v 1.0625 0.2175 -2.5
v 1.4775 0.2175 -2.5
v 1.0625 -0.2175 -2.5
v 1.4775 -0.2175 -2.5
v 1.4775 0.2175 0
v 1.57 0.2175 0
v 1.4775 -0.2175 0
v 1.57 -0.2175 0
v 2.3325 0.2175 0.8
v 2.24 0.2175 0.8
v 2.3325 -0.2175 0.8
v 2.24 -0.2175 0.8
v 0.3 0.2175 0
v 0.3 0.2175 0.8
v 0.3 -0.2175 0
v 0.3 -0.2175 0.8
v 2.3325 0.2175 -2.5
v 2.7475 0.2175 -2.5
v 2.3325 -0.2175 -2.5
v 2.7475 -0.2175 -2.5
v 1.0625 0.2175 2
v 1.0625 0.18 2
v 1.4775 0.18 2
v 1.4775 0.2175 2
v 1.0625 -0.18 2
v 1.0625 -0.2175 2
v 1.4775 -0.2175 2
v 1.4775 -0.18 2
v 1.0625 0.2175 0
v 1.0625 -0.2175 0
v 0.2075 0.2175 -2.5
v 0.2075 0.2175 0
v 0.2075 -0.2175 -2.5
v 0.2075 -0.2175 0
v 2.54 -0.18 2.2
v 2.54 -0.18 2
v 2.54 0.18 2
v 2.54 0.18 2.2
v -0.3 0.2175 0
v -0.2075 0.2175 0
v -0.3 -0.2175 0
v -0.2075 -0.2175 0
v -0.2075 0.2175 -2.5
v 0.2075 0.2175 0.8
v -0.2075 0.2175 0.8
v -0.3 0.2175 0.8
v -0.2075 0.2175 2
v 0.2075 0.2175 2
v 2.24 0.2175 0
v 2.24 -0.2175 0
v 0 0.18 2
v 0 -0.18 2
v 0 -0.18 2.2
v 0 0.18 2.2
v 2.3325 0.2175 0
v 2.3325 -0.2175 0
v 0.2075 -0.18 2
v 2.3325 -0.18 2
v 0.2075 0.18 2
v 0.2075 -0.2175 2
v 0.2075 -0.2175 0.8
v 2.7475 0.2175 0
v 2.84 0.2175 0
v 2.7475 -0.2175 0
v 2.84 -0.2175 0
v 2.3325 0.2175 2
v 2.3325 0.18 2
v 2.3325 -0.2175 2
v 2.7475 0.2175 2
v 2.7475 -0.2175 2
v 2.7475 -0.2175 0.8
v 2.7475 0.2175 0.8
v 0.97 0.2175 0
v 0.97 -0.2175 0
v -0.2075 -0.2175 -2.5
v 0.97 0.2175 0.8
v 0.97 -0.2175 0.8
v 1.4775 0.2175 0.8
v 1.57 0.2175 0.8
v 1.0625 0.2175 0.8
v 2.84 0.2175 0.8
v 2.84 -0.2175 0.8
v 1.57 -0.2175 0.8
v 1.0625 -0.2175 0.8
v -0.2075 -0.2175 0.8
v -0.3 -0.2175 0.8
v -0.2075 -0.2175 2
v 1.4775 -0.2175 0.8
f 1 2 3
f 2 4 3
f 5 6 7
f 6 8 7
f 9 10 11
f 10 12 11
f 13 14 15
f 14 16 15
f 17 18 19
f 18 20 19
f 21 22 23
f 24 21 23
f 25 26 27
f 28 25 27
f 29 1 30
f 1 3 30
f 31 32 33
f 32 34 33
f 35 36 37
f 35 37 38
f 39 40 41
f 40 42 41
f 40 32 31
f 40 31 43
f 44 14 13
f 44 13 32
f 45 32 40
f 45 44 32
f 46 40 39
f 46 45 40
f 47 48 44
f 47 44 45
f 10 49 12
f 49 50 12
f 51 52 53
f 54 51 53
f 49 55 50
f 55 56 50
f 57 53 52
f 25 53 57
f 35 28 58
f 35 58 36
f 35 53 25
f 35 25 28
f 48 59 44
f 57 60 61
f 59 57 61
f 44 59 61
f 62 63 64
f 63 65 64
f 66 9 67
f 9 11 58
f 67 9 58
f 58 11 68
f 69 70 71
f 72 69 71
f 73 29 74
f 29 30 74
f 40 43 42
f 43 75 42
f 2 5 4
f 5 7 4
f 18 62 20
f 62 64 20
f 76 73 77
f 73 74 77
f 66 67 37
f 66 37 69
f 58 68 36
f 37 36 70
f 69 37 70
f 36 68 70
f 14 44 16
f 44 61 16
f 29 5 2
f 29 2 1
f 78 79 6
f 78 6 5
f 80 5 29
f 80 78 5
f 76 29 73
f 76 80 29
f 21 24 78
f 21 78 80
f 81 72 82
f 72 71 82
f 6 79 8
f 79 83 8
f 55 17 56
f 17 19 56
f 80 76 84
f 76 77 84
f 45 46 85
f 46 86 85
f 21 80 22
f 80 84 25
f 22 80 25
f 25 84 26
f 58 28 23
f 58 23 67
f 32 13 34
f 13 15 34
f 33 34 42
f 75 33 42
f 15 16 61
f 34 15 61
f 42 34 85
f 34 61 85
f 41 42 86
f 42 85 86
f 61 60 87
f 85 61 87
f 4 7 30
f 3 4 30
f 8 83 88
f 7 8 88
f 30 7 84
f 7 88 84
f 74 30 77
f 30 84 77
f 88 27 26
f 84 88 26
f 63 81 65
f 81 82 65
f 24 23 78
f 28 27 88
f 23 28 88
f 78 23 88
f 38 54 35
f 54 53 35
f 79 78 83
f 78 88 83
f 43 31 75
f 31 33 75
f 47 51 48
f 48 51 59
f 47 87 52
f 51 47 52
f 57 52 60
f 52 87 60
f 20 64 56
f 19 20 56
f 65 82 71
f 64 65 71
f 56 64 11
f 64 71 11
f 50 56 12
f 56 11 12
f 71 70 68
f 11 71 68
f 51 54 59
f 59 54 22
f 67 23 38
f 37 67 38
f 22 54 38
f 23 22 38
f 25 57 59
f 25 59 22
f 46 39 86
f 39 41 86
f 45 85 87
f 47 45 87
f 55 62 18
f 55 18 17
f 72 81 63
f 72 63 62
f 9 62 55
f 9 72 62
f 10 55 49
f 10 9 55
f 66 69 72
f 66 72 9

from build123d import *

# Parameters (mm, degrees)
SKETCH001_W         = 2.54
SKETCH001_H         = 0.2
PAD001_DEPTH        = 0.18
PAD002_DEPTH        = 0.2175
LINEARPATTERN_COUNT = 3
LINEARPATTERN_PITCH = 1.27


with BuildPart() as part:
    # Sketch001 → Pad001 (new body, symmetric)
    with BuildSketch(Plane.XZ):
        with Locations((1.27, 2.1)):
            Rectangle(SKETCH001_W, SKETCH001_H)
    extrude(amount=PAD001_DEPTH, both=True)

    # Sketch002 → Pad002 (join, symmetric)
    with BuildSketch(Plane.XZ):
        Polygon((0.2075, 2), (0.2075, 0.8), (0.3, 0.8), (0.3, 0), (0.2075, 0), (0.2075, -2.5), (-0.2075, -2.5), (-0.2075, 0), (-0.3, 0), (-0.3, 0.8), (-0.2075, 0.8), (-0.2075, 2), align=None)
    pad002 = extrude(amount=PAD002_DEPTH, both=True)

    # LinearPattern: Pad002 ×3
    with Locations(*[(i * LINEARPATTERN_PITCH, 0, 0) for i in range(1, LINEARPATTERN_COUNT)]):
        add(pad002)


solid = part.part
